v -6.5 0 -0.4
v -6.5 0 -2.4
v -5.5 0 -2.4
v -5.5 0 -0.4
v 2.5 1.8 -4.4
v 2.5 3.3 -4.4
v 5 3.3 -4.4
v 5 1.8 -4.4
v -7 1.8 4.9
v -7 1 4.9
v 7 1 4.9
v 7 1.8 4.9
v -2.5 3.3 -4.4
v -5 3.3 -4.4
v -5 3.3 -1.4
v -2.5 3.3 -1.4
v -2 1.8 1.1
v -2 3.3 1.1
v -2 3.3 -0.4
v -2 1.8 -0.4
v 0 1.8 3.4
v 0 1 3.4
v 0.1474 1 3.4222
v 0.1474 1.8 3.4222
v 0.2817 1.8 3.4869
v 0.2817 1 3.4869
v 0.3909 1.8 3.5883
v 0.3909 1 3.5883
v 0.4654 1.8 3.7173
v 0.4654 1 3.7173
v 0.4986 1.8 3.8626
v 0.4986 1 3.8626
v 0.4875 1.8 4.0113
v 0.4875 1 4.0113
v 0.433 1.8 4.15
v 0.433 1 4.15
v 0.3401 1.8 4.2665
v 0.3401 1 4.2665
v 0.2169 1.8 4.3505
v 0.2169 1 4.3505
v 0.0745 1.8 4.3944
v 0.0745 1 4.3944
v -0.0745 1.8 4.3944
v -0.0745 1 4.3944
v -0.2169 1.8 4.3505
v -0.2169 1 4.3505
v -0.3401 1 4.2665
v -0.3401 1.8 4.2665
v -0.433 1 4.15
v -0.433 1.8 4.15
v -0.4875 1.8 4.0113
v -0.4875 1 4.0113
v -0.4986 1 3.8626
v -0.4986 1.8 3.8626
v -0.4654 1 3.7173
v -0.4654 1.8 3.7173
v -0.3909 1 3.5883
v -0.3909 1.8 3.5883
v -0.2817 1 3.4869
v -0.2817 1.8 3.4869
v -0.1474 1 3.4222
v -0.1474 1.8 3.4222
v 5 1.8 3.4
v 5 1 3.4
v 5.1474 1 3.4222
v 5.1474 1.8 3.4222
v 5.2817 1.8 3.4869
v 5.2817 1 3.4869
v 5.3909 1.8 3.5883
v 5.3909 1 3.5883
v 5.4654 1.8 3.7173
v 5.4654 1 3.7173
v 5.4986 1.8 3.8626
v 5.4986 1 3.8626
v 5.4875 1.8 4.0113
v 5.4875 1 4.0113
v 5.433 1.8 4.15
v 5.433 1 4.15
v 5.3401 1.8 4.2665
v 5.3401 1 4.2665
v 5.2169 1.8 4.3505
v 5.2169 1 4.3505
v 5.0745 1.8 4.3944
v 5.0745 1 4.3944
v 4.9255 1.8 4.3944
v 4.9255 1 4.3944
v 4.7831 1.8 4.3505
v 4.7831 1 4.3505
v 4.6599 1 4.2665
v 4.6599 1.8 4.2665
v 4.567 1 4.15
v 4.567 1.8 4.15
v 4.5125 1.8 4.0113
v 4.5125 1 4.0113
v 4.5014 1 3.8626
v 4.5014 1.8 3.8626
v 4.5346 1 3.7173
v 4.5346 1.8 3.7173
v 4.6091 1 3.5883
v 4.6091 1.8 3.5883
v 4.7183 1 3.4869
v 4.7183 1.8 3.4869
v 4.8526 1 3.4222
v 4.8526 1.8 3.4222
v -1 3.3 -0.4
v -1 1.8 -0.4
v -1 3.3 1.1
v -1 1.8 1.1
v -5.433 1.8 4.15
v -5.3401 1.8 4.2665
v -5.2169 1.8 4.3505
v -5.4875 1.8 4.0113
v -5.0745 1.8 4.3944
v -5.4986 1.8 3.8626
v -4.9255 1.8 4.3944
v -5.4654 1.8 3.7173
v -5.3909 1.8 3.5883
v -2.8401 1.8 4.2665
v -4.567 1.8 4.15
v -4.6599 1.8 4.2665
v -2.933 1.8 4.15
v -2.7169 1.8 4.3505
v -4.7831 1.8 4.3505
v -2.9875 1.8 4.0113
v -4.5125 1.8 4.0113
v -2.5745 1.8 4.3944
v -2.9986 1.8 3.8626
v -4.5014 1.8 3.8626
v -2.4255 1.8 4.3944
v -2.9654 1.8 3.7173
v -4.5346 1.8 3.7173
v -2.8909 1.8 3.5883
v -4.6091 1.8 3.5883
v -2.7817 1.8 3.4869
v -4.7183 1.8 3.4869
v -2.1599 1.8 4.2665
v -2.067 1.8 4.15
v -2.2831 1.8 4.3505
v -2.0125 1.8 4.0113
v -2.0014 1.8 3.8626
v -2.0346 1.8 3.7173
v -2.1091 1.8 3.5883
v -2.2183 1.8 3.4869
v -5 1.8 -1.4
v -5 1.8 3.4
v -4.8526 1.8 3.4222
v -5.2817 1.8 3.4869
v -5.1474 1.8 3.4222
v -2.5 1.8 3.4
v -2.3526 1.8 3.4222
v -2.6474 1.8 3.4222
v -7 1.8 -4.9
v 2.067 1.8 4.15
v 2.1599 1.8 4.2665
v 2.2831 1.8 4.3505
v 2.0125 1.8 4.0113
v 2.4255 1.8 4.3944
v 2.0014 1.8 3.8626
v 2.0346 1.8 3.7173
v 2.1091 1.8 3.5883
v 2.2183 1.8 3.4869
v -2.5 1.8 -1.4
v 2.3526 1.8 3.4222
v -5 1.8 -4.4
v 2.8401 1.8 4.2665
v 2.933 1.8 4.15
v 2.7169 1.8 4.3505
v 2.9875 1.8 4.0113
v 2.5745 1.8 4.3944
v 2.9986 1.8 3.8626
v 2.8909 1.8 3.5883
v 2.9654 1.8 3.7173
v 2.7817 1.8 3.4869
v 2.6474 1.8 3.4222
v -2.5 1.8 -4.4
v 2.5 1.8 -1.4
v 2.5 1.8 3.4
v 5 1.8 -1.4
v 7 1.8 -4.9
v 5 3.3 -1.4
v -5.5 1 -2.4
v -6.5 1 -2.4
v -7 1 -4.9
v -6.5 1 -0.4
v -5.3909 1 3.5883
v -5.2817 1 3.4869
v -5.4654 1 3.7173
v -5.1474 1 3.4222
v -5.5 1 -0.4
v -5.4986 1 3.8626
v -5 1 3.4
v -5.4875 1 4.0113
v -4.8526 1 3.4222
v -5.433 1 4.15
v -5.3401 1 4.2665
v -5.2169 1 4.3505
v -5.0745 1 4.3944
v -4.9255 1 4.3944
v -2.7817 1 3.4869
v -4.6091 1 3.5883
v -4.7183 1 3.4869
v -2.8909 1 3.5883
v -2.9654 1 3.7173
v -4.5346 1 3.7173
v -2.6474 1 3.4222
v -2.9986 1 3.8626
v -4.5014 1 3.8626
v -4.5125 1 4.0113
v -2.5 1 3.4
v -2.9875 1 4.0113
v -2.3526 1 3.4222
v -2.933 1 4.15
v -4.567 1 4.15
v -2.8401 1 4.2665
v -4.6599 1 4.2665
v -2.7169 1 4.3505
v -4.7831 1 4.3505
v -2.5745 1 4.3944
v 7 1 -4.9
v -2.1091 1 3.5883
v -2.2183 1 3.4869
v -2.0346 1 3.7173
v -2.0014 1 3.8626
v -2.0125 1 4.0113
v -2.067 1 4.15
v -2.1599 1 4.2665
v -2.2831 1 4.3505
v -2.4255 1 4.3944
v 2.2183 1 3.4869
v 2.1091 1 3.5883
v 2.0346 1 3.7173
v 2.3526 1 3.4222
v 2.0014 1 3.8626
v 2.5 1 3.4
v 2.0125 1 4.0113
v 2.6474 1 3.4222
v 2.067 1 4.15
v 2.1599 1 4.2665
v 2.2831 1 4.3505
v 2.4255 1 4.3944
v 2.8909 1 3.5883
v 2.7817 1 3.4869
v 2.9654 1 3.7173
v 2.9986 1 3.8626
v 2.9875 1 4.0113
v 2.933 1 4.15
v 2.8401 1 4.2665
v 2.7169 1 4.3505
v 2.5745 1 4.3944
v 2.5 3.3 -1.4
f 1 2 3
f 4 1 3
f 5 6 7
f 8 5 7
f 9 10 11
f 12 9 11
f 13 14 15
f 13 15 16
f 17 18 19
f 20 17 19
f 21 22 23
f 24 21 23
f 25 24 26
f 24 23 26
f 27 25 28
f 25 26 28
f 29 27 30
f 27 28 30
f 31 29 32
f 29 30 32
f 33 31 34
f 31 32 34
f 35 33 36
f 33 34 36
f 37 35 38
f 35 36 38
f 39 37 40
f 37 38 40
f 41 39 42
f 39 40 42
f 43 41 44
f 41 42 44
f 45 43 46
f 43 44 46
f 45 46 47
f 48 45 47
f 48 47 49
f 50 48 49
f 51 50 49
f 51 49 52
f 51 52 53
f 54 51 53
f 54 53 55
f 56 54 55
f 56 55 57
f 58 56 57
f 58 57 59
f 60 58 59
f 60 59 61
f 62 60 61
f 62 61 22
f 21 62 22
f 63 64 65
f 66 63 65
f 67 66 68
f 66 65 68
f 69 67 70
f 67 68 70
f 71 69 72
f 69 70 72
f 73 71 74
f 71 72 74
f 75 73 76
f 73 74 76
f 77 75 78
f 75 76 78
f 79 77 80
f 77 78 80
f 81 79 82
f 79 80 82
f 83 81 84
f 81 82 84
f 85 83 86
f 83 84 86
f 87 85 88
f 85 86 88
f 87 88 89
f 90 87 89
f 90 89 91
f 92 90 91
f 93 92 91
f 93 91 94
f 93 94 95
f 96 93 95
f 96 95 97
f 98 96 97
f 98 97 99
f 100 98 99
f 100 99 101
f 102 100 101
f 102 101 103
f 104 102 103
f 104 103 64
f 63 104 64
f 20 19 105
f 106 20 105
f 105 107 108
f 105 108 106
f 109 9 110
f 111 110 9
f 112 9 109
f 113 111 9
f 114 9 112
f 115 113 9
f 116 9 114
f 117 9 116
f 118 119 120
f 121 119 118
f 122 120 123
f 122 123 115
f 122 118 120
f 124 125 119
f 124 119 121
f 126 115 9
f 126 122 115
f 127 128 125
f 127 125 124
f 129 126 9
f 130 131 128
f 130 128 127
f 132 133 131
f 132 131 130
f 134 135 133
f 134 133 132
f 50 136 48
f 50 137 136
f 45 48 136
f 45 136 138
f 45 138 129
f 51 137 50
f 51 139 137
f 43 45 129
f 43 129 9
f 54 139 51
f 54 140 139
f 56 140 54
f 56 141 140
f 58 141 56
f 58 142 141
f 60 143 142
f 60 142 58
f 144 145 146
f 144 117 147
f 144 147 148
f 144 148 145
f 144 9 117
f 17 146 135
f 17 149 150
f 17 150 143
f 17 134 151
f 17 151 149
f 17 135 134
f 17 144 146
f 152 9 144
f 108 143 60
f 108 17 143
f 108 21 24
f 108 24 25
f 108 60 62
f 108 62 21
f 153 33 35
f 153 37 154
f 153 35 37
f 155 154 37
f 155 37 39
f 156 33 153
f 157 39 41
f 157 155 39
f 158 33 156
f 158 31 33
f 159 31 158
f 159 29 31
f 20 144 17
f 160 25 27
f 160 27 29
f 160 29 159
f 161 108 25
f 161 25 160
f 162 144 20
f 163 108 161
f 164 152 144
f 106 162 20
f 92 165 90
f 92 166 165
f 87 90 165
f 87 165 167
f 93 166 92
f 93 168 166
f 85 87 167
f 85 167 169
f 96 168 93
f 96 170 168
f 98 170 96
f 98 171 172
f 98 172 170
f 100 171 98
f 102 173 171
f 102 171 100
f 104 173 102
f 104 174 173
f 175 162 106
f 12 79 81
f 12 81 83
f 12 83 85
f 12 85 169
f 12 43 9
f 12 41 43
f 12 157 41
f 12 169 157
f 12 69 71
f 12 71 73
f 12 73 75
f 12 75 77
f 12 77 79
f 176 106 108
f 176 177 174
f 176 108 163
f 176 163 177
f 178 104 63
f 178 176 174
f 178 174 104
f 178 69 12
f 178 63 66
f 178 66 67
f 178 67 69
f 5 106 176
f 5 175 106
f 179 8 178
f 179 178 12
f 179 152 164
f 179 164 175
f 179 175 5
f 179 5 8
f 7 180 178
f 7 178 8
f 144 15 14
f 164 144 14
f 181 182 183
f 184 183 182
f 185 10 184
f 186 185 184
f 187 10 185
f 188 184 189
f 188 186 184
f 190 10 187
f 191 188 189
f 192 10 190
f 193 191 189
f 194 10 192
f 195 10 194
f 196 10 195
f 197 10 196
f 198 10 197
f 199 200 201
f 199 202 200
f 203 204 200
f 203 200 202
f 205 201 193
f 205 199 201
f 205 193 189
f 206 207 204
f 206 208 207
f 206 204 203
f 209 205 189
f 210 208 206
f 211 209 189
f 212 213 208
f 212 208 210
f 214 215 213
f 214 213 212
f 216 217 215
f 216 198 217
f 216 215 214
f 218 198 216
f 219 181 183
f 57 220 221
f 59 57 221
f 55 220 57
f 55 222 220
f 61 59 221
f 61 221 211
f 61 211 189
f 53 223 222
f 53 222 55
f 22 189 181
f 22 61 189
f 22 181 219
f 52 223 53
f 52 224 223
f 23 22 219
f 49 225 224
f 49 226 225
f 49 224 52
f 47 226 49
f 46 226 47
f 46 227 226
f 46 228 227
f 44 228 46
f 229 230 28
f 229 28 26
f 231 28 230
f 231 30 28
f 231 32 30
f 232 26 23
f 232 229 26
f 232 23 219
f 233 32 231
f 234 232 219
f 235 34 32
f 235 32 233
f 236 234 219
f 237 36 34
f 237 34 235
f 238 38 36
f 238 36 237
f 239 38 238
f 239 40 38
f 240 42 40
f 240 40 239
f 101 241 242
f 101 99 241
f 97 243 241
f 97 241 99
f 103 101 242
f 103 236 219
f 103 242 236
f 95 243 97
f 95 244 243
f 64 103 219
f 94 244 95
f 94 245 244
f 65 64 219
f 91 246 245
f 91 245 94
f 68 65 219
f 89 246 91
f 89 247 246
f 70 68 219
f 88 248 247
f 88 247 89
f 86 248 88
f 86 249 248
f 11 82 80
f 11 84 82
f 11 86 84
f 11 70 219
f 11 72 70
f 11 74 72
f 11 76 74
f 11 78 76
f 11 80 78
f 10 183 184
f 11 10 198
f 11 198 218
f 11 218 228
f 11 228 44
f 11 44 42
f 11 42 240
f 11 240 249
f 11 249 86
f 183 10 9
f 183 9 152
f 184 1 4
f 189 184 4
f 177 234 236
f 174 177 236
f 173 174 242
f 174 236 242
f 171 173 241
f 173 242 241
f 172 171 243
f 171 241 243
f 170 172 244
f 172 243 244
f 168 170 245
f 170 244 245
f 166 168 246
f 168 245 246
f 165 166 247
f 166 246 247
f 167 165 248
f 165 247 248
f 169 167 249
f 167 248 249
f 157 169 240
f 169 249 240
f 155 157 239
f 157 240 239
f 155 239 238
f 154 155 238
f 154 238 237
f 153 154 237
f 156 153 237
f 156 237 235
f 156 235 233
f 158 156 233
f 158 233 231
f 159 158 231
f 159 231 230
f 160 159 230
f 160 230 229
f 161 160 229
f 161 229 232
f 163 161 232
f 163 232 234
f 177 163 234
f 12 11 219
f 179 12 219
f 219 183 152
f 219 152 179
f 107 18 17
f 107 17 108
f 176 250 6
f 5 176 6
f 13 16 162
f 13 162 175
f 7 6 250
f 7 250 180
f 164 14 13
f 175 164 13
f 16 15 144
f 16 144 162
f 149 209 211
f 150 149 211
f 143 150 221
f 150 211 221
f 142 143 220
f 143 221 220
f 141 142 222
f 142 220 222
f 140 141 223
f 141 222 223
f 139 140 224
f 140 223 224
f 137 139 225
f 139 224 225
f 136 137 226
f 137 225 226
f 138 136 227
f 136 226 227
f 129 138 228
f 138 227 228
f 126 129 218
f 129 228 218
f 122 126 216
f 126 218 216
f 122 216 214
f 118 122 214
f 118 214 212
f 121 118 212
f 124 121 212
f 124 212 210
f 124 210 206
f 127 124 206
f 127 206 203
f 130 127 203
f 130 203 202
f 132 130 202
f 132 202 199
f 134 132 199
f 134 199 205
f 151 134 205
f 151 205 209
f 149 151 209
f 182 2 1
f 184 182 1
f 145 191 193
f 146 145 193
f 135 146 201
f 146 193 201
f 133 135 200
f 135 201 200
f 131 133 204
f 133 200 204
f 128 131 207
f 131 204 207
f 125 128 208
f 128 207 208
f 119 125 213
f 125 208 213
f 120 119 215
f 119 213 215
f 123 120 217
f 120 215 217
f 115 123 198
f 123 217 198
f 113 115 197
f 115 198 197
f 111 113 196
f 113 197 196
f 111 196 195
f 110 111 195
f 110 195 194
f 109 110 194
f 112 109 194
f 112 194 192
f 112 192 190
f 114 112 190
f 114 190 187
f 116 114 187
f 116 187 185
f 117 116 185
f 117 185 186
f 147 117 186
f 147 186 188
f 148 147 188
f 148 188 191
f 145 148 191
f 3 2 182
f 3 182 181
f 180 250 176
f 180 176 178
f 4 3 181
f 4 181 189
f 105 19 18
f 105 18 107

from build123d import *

# Parameters (mm, degrees)
SKETCH1_W           = 14
SKETCH1_H           = 9.8
BOSS_EXTRUDE1_DEPTH = 3.3
SKETCH2_W           = 14
SKETCH2_H           = 9.8
SKETCH2_W_2         = 2.5
SKETCH2_H_2         = 3
SKETCH2_W_3         = 1
SKETCH2_H_3         = 1.5
CUT_EXTRUDE1_DEPTH  = 1.5
SKETCH3_W           = 14
SKETCH3_H           = 9.8
SKETCH3_W_2         = 1
SKETCH3_H_2         = 2
CUT_EXTRUDE2_DEPTH  = 1
SKETCH4_R           = 0.5
CUT_EXTRUDE3_DEPTH  = 1


with BuildPart() as part:
    # Sketch1 → Boss-Extrude1 (new body)
    with BuildSketch(Plane(origin=(0, 0, 0), x_dir=(1, 0, 0), z_dir=(0, 1, 0))):
        Rectangle(SKETCH1_W, SKETCH1_H)
    extrude(amount=BOSS_EXTRUDE1_DEPTH)

    # Sketch2 → Cut-Extrude1 (cut)
    with BuildSketch(Plane(origin=(0, 3.3, 0), x_dir=(1, 0, 0), z_dir=(0, 1, 0))):
        Rectangle(SKETCH2_W, SKETCH2_H)
        with Locations((-3.75, 2.9)):
            Rectangle(SKETCH2_W_2, SKETCH2_H_2, mode=Mode.SUBTRACT)
        with Locations((3.75, 2.9)):
            Rectangle(SKETCH2_W_2, SKETCH2_H_2, mode=Mode.SUBTRACT)
        with Locations((-1.5, -0.35)):
            Rectangle(SKETCH2_W_3, SKETCH2_H_3, mode=Mode.SUBTRACT)
    extrude(amount=-CUT_EXTRUDE1_DEPTH, mode=Mode.SUBTRACT)

    # Sketch3 → Cut-Extrude2 (cut)
    with BuildSketch(Plane.XZ):
        Rectangle(SKETCH3_W, SKETCH3_H)
        with Locations((-6, -1.4)):
            Rectangle(SKETCH3_W_2, SKETCH3_H_2, mode=Mode.SUBTRACT)
    extrude(amount=-CUT_EXTRUDE2_DEPTH, mode=Mode.SUBTRACT)

    # Sketch4 → Cut-Extrude3 (cut)
    with BuildSketch(Plane.XZ.offset(-1)):
        with Locations(Location((-5, 3.9, 0), (0, 0, 270))):
            Circle(SKETCH4_R)
        with Locations(Location((-2.5, 3.9, 0), (0, 0, 270))):
            Circle(SKETCH4_R)
        with Locations(Location((0, 3.9, 0), (0, 0, 270))):
            Circle(SKETCH4_R)
        with Locations(Location((2.5, 3.9, 0), (0, 0, 270))):
            Circle(SKETCH4_R)
        with Locations(Location((5, 3.9, 0), (0, 0, 270))):
            Circle(SKETCH4_R)
    extrude(amount=-CUT_EXTRUDE3_DEPTH, mode=Mode.SUBTRACT)


solid = part.part
